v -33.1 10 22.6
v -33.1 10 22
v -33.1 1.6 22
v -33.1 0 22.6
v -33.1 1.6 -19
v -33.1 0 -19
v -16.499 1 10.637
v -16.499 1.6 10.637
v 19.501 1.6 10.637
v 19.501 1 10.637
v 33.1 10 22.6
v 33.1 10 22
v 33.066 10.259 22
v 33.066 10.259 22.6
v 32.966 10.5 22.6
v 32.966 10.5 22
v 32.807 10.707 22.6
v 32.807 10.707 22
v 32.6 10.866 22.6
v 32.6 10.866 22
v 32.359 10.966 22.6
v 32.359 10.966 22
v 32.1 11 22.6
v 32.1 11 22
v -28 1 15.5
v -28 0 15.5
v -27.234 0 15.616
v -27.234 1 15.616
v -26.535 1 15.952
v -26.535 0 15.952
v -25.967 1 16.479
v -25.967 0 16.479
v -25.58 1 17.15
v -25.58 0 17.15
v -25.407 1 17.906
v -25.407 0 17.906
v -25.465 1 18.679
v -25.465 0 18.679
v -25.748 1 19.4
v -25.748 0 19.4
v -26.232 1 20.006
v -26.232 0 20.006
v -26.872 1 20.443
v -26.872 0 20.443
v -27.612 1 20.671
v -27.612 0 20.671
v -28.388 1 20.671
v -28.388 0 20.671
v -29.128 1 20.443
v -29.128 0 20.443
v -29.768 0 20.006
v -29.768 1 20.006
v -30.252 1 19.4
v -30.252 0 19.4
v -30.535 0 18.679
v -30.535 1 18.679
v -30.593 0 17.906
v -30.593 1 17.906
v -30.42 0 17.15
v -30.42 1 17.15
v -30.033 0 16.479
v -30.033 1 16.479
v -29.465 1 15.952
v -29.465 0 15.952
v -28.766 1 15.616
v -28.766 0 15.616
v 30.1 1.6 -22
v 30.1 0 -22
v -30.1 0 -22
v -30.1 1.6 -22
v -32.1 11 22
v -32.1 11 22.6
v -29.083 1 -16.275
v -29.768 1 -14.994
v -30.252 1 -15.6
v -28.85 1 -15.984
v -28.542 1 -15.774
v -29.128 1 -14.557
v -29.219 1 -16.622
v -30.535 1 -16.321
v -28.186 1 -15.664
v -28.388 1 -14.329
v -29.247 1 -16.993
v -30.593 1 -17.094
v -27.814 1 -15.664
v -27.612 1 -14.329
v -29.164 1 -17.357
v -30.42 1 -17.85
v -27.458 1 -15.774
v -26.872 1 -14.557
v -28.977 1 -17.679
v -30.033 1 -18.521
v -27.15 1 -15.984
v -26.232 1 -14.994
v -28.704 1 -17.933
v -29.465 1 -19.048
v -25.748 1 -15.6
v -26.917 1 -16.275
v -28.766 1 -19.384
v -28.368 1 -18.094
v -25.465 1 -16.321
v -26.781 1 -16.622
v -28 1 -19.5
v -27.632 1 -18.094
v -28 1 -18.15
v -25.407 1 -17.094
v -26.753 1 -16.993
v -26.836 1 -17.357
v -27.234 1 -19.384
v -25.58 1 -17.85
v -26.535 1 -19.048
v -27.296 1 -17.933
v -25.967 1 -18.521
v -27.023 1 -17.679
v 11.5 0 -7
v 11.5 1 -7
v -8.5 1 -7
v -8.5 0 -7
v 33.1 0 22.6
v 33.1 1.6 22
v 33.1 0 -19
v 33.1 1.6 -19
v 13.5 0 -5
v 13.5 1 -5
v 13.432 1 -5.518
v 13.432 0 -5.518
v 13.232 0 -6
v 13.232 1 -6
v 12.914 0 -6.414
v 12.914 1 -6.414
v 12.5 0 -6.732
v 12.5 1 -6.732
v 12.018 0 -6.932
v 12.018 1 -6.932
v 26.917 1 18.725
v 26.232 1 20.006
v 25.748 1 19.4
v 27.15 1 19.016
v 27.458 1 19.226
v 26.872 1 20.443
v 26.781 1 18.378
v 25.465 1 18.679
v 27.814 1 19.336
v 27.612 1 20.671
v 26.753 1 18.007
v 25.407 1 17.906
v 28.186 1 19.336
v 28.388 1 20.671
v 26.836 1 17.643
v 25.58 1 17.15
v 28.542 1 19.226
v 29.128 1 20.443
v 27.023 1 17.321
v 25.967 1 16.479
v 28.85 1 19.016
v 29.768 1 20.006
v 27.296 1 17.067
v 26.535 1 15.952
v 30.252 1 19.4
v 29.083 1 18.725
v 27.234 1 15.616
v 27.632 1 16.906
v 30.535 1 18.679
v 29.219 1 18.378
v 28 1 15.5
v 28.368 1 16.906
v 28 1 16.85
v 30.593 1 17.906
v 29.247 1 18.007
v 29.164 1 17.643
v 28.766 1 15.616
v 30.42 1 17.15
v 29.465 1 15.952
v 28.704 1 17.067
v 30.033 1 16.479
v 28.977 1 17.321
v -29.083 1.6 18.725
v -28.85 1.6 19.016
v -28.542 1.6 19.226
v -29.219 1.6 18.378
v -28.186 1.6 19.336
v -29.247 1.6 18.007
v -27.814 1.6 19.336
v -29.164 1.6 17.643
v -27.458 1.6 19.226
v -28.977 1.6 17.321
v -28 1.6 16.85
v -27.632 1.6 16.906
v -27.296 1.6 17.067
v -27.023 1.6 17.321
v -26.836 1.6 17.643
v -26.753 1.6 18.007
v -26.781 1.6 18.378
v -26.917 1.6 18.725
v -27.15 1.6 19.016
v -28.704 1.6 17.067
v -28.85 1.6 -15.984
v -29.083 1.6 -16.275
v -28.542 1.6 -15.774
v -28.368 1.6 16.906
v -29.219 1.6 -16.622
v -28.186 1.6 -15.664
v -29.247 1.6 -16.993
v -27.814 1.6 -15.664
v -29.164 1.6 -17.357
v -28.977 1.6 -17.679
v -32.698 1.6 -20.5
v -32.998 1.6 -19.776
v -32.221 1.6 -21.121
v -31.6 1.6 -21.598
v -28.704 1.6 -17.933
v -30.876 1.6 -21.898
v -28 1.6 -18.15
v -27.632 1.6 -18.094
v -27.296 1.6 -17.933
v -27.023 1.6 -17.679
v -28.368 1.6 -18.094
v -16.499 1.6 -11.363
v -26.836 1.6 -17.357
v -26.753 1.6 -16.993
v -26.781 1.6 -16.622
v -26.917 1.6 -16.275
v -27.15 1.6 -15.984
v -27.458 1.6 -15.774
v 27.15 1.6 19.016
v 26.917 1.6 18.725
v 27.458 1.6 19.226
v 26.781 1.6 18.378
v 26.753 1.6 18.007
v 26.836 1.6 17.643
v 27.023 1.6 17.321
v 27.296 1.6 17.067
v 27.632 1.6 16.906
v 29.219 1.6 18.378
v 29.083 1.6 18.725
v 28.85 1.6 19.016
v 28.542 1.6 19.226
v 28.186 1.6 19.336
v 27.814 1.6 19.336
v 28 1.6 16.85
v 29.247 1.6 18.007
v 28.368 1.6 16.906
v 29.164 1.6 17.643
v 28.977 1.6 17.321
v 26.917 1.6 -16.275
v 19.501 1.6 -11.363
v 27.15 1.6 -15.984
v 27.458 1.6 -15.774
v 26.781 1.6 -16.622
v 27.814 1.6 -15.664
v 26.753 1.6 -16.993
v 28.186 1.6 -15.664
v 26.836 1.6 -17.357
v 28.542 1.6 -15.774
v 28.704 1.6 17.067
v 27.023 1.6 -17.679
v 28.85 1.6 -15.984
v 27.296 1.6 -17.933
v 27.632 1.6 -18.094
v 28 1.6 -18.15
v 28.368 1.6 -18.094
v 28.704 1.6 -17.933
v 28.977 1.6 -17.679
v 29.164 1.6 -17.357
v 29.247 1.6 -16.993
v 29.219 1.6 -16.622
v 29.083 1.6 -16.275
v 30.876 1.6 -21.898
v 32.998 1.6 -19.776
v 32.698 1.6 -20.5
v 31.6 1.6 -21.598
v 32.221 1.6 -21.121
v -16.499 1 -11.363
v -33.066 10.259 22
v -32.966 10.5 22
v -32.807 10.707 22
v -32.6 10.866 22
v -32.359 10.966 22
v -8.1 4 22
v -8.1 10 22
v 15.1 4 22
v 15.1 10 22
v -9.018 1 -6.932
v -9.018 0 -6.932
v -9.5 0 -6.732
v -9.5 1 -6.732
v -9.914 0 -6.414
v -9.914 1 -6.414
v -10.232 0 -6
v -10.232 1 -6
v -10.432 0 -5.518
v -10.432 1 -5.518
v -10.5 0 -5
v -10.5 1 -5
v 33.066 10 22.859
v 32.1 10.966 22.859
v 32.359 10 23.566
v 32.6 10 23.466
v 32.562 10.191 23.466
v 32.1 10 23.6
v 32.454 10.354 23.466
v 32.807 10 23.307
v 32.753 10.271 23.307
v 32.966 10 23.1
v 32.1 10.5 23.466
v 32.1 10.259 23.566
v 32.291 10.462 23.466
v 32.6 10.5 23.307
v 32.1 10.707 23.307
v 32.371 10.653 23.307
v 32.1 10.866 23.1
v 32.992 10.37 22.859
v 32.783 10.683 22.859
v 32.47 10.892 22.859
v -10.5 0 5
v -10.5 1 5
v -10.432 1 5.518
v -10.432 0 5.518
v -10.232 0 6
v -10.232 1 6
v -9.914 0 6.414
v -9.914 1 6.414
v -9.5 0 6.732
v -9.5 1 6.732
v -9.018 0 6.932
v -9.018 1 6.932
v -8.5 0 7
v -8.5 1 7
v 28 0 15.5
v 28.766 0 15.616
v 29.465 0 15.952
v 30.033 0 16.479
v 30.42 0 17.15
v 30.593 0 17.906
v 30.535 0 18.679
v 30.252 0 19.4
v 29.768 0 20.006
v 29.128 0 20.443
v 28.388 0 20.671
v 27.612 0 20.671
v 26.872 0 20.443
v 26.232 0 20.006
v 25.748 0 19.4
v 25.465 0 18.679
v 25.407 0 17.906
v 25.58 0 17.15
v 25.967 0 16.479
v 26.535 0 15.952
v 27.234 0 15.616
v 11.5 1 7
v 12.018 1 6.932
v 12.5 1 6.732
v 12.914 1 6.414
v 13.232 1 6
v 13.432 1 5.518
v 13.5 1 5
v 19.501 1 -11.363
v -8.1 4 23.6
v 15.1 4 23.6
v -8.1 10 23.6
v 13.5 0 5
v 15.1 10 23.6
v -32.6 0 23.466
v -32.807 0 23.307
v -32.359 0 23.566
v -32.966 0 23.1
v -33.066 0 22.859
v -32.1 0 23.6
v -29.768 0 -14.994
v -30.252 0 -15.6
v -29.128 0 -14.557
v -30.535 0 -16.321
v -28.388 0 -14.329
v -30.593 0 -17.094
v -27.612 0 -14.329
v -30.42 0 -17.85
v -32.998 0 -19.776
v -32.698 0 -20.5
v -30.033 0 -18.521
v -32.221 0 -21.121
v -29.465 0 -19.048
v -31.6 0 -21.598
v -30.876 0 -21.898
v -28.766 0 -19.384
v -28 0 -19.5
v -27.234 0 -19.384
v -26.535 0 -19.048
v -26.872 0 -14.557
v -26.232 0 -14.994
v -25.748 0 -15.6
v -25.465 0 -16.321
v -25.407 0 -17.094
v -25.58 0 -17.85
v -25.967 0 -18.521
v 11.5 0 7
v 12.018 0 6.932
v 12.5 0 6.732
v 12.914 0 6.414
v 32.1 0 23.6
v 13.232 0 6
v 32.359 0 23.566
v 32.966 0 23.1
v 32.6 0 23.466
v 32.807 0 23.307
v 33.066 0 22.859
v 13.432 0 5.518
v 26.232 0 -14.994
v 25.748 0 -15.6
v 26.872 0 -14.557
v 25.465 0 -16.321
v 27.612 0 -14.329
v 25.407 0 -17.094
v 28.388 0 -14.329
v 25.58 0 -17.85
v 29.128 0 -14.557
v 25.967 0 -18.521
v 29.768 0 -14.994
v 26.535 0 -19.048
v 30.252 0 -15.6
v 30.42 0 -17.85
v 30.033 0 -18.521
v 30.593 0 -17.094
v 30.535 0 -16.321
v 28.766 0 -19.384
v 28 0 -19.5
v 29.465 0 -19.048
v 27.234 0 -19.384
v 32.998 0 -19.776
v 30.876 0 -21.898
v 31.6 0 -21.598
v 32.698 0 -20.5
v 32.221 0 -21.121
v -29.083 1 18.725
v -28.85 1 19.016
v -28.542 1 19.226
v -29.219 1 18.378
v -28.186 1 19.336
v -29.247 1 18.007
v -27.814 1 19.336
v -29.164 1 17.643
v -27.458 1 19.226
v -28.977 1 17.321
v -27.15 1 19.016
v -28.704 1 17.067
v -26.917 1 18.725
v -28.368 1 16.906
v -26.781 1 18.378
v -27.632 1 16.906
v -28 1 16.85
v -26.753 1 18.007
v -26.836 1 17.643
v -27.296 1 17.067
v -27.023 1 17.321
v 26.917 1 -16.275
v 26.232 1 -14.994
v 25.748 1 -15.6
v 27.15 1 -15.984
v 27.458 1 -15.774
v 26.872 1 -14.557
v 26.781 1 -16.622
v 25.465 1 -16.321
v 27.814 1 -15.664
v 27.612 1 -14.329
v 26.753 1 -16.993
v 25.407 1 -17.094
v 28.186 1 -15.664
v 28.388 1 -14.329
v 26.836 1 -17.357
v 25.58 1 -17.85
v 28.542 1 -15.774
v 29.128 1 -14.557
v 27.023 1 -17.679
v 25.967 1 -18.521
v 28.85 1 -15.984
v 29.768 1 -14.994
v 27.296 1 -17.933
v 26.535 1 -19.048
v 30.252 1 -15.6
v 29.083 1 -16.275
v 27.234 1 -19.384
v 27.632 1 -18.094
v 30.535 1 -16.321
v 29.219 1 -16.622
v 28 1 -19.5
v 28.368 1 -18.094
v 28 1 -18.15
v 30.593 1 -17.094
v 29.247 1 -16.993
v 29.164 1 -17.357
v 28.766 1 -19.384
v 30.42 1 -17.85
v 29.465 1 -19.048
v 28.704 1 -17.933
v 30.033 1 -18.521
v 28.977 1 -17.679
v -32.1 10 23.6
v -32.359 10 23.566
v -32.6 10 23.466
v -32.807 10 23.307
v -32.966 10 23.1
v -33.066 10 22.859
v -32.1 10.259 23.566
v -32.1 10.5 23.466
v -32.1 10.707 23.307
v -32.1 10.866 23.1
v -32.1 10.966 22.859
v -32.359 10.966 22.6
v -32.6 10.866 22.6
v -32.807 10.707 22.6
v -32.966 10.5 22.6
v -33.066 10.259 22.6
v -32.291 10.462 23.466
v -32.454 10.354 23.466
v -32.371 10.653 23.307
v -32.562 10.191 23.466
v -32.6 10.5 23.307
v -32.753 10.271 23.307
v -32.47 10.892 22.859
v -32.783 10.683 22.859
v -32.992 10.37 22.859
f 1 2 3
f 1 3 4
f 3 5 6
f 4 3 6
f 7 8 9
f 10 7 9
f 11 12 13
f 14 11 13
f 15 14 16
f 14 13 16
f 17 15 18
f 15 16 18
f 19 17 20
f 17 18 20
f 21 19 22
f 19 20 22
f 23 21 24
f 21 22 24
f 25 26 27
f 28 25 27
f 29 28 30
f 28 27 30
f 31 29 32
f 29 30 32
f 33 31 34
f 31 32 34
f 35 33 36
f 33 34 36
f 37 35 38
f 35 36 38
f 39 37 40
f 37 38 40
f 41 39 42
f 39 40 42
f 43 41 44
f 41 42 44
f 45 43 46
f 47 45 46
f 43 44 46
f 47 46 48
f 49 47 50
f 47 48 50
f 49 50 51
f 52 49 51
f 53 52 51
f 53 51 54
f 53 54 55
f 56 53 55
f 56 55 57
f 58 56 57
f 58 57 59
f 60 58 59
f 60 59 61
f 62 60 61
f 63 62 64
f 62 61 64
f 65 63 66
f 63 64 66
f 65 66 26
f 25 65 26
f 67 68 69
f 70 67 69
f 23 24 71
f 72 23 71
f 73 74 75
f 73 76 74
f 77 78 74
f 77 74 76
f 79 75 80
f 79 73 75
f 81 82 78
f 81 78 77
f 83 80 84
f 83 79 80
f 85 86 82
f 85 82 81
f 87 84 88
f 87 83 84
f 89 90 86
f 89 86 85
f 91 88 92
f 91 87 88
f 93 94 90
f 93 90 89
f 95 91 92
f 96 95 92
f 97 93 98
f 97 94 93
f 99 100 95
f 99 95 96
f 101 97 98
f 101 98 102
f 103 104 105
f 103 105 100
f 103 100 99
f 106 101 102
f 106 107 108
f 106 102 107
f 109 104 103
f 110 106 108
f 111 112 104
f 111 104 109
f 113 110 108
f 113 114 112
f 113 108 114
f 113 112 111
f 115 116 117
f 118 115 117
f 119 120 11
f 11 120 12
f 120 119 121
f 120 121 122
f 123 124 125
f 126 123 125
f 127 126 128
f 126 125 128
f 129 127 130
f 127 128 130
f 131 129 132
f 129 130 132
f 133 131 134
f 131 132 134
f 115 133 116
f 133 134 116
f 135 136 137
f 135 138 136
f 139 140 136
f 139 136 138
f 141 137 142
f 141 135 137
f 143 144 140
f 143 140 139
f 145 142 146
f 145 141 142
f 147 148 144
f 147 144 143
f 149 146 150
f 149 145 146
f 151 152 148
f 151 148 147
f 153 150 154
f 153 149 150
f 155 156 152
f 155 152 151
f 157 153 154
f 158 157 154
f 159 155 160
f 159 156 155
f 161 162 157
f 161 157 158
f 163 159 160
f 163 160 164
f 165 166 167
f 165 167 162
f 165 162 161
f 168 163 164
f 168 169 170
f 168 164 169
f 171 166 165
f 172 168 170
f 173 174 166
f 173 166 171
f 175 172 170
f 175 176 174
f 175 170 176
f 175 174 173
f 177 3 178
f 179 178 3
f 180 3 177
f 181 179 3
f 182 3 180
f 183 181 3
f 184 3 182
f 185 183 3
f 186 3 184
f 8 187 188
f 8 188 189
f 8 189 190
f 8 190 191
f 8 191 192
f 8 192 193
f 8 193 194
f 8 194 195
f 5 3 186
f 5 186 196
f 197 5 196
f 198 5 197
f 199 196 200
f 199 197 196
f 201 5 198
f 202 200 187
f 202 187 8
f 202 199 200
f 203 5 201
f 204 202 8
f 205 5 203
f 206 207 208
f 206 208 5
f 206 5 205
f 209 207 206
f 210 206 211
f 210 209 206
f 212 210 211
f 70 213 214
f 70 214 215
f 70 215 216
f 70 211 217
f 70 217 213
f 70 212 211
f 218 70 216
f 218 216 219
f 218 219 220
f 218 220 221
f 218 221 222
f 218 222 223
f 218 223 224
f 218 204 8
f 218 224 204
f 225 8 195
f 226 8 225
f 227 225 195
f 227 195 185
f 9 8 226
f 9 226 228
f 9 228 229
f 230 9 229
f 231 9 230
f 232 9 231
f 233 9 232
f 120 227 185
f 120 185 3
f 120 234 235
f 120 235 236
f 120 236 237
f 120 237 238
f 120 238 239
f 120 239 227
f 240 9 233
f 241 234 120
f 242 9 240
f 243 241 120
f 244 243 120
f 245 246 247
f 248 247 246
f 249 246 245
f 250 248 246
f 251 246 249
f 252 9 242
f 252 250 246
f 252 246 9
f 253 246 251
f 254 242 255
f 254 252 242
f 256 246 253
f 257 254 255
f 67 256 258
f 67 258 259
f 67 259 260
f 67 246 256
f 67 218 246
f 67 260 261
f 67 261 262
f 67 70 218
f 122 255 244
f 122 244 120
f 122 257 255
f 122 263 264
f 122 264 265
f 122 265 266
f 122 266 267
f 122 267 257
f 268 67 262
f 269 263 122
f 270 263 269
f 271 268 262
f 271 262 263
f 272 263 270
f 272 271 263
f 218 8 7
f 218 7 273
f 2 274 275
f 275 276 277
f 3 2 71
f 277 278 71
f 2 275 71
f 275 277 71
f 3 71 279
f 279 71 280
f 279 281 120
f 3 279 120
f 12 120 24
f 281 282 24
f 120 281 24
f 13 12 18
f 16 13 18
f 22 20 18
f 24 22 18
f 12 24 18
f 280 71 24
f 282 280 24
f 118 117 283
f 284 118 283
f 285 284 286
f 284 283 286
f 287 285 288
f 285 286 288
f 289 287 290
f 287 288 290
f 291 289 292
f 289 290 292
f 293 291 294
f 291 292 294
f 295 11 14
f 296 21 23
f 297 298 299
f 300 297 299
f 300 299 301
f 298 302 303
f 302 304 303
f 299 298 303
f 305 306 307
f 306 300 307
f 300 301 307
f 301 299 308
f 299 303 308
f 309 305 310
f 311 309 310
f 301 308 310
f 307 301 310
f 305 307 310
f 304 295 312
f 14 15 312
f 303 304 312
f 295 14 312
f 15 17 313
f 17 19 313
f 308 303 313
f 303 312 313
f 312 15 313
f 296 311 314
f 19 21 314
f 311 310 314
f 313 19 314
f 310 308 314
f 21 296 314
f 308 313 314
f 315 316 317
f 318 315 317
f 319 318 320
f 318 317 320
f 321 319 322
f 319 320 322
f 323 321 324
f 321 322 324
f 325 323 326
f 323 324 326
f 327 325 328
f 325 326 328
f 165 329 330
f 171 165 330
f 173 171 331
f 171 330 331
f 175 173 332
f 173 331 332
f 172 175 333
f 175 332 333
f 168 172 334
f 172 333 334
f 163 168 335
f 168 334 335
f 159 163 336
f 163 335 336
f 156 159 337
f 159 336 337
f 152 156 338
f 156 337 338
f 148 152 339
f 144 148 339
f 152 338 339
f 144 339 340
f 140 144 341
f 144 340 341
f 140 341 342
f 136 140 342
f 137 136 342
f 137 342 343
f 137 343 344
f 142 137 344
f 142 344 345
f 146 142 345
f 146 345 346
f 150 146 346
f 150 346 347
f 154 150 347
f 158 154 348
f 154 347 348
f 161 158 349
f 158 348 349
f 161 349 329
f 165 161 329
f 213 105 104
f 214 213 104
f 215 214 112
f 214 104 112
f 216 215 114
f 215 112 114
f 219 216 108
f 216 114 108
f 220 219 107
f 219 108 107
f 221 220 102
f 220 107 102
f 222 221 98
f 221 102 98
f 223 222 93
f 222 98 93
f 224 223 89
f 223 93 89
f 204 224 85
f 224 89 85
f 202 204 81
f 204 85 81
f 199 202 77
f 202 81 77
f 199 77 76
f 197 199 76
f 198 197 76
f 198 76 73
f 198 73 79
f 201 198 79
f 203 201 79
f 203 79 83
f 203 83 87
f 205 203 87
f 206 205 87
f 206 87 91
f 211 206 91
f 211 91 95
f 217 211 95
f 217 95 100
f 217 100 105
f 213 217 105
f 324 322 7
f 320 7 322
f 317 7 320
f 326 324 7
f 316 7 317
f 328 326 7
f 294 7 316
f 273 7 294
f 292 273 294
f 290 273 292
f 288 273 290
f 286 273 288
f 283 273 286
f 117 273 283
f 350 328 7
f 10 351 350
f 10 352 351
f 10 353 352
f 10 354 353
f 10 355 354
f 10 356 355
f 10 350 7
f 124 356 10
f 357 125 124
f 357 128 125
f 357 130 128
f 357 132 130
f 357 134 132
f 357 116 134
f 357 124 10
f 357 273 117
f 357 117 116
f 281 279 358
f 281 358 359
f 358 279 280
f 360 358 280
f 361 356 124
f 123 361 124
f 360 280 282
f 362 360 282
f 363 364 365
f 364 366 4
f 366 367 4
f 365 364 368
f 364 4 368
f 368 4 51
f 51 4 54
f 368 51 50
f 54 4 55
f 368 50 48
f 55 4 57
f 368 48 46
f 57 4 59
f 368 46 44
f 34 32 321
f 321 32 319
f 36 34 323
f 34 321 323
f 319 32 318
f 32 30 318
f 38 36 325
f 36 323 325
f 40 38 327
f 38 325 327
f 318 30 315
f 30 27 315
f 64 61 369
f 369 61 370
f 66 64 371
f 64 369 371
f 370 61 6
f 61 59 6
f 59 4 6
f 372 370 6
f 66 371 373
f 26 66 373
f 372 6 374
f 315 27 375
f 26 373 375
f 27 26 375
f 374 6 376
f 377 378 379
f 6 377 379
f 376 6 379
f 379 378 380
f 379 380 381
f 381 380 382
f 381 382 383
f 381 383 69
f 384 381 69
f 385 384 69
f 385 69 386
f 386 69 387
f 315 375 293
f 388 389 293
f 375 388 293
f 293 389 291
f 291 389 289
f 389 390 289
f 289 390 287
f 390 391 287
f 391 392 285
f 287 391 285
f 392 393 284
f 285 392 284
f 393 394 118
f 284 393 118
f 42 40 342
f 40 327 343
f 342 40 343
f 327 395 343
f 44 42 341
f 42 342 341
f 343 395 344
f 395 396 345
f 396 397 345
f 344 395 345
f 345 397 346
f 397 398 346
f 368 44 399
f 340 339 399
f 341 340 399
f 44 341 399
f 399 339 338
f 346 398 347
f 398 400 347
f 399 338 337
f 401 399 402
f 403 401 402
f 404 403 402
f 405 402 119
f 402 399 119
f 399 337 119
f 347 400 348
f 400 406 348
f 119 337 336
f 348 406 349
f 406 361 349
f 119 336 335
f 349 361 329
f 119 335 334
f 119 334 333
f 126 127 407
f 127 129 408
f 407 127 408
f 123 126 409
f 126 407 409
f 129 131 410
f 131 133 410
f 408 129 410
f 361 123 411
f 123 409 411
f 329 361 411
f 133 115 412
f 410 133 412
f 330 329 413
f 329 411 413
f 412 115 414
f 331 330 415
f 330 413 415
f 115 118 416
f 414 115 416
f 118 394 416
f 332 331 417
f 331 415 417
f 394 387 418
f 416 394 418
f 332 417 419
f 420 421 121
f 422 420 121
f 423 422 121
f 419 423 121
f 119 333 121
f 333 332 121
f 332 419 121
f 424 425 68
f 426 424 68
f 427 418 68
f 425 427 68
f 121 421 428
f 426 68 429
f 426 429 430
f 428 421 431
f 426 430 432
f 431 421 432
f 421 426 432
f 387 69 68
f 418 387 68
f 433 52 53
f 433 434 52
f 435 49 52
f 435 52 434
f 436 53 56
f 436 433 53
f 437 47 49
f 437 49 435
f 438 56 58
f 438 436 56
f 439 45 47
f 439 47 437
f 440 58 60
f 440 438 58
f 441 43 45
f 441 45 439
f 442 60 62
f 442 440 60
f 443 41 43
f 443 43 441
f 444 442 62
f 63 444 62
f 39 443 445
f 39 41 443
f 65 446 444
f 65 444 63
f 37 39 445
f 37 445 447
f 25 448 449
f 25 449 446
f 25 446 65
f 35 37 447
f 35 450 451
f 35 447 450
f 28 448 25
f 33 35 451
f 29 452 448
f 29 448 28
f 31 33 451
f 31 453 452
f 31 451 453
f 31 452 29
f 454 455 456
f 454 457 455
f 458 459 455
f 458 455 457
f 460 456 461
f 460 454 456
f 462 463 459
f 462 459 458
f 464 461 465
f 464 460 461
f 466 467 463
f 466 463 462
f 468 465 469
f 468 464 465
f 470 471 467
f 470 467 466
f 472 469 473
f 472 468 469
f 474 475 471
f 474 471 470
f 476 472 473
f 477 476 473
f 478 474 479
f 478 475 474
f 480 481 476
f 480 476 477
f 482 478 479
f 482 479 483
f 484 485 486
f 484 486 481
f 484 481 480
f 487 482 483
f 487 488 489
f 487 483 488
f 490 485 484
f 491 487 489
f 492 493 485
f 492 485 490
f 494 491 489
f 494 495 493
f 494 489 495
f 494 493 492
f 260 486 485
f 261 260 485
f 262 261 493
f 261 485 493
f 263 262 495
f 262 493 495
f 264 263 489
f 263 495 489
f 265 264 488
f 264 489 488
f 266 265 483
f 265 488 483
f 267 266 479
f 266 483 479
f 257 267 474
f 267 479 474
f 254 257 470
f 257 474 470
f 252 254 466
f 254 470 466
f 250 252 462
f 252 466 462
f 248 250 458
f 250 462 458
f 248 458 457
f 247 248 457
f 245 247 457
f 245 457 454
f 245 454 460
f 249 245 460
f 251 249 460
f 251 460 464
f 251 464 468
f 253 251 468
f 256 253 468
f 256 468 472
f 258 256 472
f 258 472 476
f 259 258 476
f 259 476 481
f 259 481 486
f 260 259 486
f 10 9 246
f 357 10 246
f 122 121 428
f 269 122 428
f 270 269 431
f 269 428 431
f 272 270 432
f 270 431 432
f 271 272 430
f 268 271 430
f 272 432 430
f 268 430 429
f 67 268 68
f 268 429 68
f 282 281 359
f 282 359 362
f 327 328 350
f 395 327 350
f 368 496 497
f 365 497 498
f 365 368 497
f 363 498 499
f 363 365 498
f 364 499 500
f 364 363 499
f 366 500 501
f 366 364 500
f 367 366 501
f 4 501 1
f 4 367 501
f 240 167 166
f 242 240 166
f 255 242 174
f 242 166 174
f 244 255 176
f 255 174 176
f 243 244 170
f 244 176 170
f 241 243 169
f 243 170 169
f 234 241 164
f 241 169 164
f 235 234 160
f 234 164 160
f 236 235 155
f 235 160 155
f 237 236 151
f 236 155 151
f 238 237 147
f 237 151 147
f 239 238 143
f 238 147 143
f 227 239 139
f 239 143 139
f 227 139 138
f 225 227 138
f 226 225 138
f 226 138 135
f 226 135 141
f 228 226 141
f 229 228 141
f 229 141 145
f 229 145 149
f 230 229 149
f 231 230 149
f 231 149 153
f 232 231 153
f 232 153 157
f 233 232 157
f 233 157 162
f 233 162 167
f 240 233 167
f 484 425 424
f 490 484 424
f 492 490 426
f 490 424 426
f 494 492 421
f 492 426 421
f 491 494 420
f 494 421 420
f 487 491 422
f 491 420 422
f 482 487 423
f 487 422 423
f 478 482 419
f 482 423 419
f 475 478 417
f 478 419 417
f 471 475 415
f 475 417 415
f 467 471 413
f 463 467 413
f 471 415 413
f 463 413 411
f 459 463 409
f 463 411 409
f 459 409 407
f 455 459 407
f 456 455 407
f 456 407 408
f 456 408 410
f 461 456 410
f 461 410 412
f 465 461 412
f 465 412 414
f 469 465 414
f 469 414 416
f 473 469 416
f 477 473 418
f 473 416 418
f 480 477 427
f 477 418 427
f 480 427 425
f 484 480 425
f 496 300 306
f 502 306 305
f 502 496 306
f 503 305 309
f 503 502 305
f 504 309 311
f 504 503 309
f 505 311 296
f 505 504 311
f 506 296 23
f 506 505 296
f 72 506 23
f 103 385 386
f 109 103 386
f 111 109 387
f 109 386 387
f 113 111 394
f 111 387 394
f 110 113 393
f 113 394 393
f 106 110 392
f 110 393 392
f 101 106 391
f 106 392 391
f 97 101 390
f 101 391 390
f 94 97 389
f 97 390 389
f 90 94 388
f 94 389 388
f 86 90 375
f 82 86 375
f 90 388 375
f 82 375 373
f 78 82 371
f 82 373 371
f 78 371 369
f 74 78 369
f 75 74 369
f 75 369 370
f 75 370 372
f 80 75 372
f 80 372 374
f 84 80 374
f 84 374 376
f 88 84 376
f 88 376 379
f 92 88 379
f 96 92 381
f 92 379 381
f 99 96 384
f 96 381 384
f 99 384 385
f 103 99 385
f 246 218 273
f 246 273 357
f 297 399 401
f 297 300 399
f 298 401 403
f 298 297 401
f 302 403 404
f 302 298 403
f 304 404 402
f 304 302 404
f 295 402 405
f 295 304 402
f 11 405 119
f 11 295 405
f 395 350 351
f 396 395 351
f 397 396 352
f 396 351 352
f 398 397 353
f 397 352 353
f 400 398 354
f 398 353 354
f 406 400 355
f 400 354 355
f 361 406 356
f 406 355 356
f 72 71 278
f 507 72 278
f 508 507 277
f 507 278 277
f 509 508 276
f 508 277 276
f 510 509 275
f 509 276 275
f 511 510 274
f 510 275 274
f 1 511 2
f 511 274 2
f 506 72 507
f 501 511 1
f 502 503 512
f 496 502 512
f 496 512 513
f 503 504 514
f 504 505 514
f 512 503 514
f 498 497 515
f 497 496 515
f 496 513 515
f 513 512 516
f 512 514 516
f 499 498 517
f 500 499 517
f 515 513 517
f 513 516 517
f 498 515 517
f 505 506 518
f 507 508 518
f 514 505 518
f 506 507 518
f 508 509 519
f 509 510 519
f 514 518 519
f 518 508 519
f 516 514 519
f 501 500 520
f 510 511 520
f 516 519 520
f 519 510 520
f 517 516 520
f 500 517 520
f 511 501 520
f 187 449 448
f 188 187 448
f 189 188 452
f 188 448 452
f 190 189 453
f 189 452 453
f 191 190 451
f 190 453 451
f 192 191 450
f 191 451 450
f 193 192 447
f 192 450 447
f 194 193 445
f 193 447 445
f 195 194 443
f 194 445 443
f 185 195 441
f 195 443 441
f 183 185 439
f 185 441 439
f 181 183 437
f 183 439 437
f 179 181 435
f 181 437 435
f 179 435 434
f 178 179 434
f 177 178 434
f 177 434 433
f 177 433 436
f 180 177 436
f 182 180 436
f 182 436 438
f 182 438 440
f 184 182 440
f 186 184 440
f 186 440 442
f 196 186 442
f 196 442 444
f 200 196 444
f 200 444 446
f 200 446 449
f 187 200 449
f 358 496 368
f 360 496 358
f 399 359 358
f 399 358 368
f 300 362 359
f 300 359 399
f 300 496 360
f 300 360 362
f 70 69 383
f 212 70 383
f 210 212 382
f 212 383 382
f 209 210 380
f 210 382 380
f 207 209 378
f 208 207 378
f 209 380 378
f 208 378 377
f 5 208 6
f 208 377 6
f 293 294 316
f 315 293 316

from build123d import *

# Parameters (mm, degrees)
EXTRUDE_1_DEPTH        = 1.6
SKETCH_2_W             = 23.2
SKETCH_2_H             = 6
EXTRUDE_719_DEPTH      = 1.6
CUT_EXTRUDE_1150_REACH = 43.724
SKETCH_5_R             = 2.6
CUT_EXTRUDE_1612_DEPTH = 1
CUT_EXTRUDE_1748_REACH = 43.864
SKETCH_7_R             = 1.25
SKETCH_9_W             = 36
SKETCH_9_H             = 22
CUT_EXTRUDE_2286_DEPTH = 0.6
FILLET_2_R             = 1


with BuildPart() as part:
    # 草图1 → 凸台-拉伸1 (new body)
    with BuildSketch(Plane(origin=(0, 0, 0), x_dir=(1, 0, 0), z_dir=(0, 1, 0))):
        with BuildLine():
            Line((-33.1, -22), (33.1, -22))
            Line((33.1, -22), (33.1, 19))
            ThreePointArc((33.1, 19), (32.221320344, 21.121320344), (30.1, 22))
            Line((30.1, 22), (-30.1, 22))
            ThreePointArc((-30.1, 22), (-32.221320344, 21.121320344), (-33.1, 19))
            Line((-33.1, 19), (-33.1, -22))
        make_face()
    extrude(amount=EXTRUDE_1_DEPTH)

    # 草图2 → Extrude 719 (add)
    with BuildSketch(Plane.XY.offset(22)):
        with BuildLine():
            Line((-33.1, 0), (33.1, 0))
            Line((33.1, 0), (33.1, 10))
            ThreePointArc((33.1, 10), (32.807106781, 10.707106781), (32.1, 11))
            Line((32.1, 11), (17.1, 11))
            Line((17.1, 11), (-9.1, 11))
            Line((-9.1, 11), (-32.1, 11))
            ThreePointArc((-32.1, 11), (-32.807106781, 10.707106781), (-33.1, 10))
            Line((-33.1, 10), (-33.1, 0))
        make_face()
        with Locations((3.5, 7)):
            Rectangle(SKETCH_2_W, SKETCH_2_H, mode=Mode.SUBTRACT)
    extrude(amount=EXTRUDE_719_DEPTH)

    # 草图3 → Cut-Extrude 1150 (cut, up to next)
    with BuildSketch(Plane(origin=(0, 1.6, 0), x_dir=(1, 0, 0), z_dir=(0, 1, 0)), mode=Mode.PRIVATE) as cut_extrude_1150_sk1:
        with BuildLine():
            Line((-8.5, -7), (11.5, -7))
            ThreePointArc((11.5, -7), (12.914213562, -6.414213562), (13.5, -5))
            Line((13.5, -5), (13.5, 5))
            ThreePointArc((13.5, 5), (12.914213562, 6.414213562), (11.5, 7))
            Line((11.5, 7), (-8.5, 7))
            ThreePointArc((-8.5, 7), (-9.914213562, 6.414213562), (-10.5, 5))
            Line((-10.5, 5), (-10.5, -5))
            ThreePointArc((-10.5, -5), (-9.914213562, -6.414213562), (-8.5, -7))
        make_face()
    cut_extrude_1150_tool1 = extrude(cut_extrude_1150_sk1.sketch, amount=-CUT_EXTRUDE_1150_REACH, mode=Mode.PRIVATE) & part.part
    add(cut_extrude_1150_tool1.solids().sort_by_distance((1.5, 1.6, 0))[0], mode=Mode.SUBTRACT)

    # 草图5 → Cut-Extrude 1612 (cut)
    with BuildSketch(Plane.XZ):
        with Locations(Location((-28, -16.9, 0), (0, 0, 270))):
            Circle(SKETCH_5_R)
        with Locations(Location((28, -16.9, 0), (0, 0, 270))):
            Circle(SKETCH_5_R)
        with Locations(Location((28, 18.1, 0), (0, 0, 270))):
            Circle(SKETCH_5_R)
        with Locations(Location((-28, 18.1, 0), (0, 0, 270))):
            Circle(SKETCH_5_R)
    extrude(amount=-CUT_EXTRUDE_1612_DEPTH, mode=Mode.SUBTRACT)

    # 草图7 → Cut-Extrude 1748 (cut, up to next)
    with BuildSketch(Plane.XZ.offset(-1), mode=Mode.PRIVATE) as cut_extrude_1748_sk1:
        with Locations(Location((-28, -16.9, 0), (0, 0, 270))):
            Circle(SKETCH_7_R)
    cut_extrude_1748_tool1 = extrude(cut_extrude_1748_sk1.sketch, amount=-CUT_EXTRUDE_1748_REACH, mode=Mode.PRIVATE) & part.part
    # 草图7 → Cut-Extrude 1748 (cut, up to next)
    with BuildSketch(Plane.XZ.offset(-1), mode=Mode.PRIVATE) as cut_extrude_1748_sk2:
        with Locations(Location((28, -16.9, 0), (0, 0, 270))):
            Circle(SKETCH_7_R)
    cut_extrude_1748_tool2 = extrude(cut_extrude_1748_sk2.sketch, amount=-CUT_EXTRUDE_1748_REACH, mode=Mode.PRIVATE) & part.part
    # 草图7 → Cut-Extrude 1748 (cut, up to next)
    with BuildSketch(Plane.XZ.offset(-1), mode=Mode.PRIVATE) as cut_extrude_1748_sk3:
        with Locations(Location((28, 18.1, 0), (0, 0, 270))):
            Circle(SKETCH_7_R)
    cut_extrude_1748_tool3 = extrude(cut_extrude_1748_sk3.sketch, amount=-CUT_EXTRUDE_1748_REACH, mode=Mode.PRIVATE) & part.part
    # 草图7 → Cut-Extrude 1748 (cut, up to next)
    with BuildSketch(Plane.XZ.offset(-1), mode=Mode.PRIVATE) as cut_extrude_1748_sk4:
        with Locations(Location((-28, 18.1, 0), (0, 0, 270))):
            Circle(SKETCH_7_R)
    cut_extrude_1748_tool4 = extrude(cut_extrude_1748_sk4.sketch, amount=-CUT_EXTRUDE_1748_REACH, mode=Mode.PRIVATE) & part.part
    add(cut_extrude_1748_tool1.solids().sort_by_distance((-28, 1, -16.9))[0], mode=Mode.SUBTRACT)
    add(cut_extrude_1748_tool2.solids().sort_by_distance((28, 1, -16.9))[0], mode=Mode.SUBTRACT)
    add(cut_extrude_1748_tool3.solids().sort_by_distance((28, 1, 18.1))[0], mode=Mode.SUBTRACT)
    add(cut_extrude_1748_tool4.solids().sort_by_distance((-28, 1, 18.1))[0], mode=Mode.SUBTRACT)

    # 草图9 → Cut-Extrude 2286 (cut)
    with BuildSketch(Plane(origin=(0, 1.6, 0), x_dir=(1, 0, 0), z_dir=(0, 1, 0))):
        with Locations((1.500900608, 0.362797629)):
            Rectangle(SKETCH_9_W, SKETCH_9_H)
    extrude(amount=-CUT_EXTRUDE_2286_DEPTH, mode=Mode.SUBTRACT)

    # 圆角2
    fillet_2_edges = [part.edges().sort_by_distance(p)[0] for p in [
        (32.807106781, 10.707106781, 23.6),
        (0, 11, 23.6),
        (-32.807106781, 10.707106781, 23.6),
        (-33.1, 5, 23.6),
        (33.1, 5, 23.6),
    ]]
    fillet(fillet_2_edges, radius=FILLET_2_R - 0.0001)  # a hair under: the kernel refuses the full size


solid = part.part
